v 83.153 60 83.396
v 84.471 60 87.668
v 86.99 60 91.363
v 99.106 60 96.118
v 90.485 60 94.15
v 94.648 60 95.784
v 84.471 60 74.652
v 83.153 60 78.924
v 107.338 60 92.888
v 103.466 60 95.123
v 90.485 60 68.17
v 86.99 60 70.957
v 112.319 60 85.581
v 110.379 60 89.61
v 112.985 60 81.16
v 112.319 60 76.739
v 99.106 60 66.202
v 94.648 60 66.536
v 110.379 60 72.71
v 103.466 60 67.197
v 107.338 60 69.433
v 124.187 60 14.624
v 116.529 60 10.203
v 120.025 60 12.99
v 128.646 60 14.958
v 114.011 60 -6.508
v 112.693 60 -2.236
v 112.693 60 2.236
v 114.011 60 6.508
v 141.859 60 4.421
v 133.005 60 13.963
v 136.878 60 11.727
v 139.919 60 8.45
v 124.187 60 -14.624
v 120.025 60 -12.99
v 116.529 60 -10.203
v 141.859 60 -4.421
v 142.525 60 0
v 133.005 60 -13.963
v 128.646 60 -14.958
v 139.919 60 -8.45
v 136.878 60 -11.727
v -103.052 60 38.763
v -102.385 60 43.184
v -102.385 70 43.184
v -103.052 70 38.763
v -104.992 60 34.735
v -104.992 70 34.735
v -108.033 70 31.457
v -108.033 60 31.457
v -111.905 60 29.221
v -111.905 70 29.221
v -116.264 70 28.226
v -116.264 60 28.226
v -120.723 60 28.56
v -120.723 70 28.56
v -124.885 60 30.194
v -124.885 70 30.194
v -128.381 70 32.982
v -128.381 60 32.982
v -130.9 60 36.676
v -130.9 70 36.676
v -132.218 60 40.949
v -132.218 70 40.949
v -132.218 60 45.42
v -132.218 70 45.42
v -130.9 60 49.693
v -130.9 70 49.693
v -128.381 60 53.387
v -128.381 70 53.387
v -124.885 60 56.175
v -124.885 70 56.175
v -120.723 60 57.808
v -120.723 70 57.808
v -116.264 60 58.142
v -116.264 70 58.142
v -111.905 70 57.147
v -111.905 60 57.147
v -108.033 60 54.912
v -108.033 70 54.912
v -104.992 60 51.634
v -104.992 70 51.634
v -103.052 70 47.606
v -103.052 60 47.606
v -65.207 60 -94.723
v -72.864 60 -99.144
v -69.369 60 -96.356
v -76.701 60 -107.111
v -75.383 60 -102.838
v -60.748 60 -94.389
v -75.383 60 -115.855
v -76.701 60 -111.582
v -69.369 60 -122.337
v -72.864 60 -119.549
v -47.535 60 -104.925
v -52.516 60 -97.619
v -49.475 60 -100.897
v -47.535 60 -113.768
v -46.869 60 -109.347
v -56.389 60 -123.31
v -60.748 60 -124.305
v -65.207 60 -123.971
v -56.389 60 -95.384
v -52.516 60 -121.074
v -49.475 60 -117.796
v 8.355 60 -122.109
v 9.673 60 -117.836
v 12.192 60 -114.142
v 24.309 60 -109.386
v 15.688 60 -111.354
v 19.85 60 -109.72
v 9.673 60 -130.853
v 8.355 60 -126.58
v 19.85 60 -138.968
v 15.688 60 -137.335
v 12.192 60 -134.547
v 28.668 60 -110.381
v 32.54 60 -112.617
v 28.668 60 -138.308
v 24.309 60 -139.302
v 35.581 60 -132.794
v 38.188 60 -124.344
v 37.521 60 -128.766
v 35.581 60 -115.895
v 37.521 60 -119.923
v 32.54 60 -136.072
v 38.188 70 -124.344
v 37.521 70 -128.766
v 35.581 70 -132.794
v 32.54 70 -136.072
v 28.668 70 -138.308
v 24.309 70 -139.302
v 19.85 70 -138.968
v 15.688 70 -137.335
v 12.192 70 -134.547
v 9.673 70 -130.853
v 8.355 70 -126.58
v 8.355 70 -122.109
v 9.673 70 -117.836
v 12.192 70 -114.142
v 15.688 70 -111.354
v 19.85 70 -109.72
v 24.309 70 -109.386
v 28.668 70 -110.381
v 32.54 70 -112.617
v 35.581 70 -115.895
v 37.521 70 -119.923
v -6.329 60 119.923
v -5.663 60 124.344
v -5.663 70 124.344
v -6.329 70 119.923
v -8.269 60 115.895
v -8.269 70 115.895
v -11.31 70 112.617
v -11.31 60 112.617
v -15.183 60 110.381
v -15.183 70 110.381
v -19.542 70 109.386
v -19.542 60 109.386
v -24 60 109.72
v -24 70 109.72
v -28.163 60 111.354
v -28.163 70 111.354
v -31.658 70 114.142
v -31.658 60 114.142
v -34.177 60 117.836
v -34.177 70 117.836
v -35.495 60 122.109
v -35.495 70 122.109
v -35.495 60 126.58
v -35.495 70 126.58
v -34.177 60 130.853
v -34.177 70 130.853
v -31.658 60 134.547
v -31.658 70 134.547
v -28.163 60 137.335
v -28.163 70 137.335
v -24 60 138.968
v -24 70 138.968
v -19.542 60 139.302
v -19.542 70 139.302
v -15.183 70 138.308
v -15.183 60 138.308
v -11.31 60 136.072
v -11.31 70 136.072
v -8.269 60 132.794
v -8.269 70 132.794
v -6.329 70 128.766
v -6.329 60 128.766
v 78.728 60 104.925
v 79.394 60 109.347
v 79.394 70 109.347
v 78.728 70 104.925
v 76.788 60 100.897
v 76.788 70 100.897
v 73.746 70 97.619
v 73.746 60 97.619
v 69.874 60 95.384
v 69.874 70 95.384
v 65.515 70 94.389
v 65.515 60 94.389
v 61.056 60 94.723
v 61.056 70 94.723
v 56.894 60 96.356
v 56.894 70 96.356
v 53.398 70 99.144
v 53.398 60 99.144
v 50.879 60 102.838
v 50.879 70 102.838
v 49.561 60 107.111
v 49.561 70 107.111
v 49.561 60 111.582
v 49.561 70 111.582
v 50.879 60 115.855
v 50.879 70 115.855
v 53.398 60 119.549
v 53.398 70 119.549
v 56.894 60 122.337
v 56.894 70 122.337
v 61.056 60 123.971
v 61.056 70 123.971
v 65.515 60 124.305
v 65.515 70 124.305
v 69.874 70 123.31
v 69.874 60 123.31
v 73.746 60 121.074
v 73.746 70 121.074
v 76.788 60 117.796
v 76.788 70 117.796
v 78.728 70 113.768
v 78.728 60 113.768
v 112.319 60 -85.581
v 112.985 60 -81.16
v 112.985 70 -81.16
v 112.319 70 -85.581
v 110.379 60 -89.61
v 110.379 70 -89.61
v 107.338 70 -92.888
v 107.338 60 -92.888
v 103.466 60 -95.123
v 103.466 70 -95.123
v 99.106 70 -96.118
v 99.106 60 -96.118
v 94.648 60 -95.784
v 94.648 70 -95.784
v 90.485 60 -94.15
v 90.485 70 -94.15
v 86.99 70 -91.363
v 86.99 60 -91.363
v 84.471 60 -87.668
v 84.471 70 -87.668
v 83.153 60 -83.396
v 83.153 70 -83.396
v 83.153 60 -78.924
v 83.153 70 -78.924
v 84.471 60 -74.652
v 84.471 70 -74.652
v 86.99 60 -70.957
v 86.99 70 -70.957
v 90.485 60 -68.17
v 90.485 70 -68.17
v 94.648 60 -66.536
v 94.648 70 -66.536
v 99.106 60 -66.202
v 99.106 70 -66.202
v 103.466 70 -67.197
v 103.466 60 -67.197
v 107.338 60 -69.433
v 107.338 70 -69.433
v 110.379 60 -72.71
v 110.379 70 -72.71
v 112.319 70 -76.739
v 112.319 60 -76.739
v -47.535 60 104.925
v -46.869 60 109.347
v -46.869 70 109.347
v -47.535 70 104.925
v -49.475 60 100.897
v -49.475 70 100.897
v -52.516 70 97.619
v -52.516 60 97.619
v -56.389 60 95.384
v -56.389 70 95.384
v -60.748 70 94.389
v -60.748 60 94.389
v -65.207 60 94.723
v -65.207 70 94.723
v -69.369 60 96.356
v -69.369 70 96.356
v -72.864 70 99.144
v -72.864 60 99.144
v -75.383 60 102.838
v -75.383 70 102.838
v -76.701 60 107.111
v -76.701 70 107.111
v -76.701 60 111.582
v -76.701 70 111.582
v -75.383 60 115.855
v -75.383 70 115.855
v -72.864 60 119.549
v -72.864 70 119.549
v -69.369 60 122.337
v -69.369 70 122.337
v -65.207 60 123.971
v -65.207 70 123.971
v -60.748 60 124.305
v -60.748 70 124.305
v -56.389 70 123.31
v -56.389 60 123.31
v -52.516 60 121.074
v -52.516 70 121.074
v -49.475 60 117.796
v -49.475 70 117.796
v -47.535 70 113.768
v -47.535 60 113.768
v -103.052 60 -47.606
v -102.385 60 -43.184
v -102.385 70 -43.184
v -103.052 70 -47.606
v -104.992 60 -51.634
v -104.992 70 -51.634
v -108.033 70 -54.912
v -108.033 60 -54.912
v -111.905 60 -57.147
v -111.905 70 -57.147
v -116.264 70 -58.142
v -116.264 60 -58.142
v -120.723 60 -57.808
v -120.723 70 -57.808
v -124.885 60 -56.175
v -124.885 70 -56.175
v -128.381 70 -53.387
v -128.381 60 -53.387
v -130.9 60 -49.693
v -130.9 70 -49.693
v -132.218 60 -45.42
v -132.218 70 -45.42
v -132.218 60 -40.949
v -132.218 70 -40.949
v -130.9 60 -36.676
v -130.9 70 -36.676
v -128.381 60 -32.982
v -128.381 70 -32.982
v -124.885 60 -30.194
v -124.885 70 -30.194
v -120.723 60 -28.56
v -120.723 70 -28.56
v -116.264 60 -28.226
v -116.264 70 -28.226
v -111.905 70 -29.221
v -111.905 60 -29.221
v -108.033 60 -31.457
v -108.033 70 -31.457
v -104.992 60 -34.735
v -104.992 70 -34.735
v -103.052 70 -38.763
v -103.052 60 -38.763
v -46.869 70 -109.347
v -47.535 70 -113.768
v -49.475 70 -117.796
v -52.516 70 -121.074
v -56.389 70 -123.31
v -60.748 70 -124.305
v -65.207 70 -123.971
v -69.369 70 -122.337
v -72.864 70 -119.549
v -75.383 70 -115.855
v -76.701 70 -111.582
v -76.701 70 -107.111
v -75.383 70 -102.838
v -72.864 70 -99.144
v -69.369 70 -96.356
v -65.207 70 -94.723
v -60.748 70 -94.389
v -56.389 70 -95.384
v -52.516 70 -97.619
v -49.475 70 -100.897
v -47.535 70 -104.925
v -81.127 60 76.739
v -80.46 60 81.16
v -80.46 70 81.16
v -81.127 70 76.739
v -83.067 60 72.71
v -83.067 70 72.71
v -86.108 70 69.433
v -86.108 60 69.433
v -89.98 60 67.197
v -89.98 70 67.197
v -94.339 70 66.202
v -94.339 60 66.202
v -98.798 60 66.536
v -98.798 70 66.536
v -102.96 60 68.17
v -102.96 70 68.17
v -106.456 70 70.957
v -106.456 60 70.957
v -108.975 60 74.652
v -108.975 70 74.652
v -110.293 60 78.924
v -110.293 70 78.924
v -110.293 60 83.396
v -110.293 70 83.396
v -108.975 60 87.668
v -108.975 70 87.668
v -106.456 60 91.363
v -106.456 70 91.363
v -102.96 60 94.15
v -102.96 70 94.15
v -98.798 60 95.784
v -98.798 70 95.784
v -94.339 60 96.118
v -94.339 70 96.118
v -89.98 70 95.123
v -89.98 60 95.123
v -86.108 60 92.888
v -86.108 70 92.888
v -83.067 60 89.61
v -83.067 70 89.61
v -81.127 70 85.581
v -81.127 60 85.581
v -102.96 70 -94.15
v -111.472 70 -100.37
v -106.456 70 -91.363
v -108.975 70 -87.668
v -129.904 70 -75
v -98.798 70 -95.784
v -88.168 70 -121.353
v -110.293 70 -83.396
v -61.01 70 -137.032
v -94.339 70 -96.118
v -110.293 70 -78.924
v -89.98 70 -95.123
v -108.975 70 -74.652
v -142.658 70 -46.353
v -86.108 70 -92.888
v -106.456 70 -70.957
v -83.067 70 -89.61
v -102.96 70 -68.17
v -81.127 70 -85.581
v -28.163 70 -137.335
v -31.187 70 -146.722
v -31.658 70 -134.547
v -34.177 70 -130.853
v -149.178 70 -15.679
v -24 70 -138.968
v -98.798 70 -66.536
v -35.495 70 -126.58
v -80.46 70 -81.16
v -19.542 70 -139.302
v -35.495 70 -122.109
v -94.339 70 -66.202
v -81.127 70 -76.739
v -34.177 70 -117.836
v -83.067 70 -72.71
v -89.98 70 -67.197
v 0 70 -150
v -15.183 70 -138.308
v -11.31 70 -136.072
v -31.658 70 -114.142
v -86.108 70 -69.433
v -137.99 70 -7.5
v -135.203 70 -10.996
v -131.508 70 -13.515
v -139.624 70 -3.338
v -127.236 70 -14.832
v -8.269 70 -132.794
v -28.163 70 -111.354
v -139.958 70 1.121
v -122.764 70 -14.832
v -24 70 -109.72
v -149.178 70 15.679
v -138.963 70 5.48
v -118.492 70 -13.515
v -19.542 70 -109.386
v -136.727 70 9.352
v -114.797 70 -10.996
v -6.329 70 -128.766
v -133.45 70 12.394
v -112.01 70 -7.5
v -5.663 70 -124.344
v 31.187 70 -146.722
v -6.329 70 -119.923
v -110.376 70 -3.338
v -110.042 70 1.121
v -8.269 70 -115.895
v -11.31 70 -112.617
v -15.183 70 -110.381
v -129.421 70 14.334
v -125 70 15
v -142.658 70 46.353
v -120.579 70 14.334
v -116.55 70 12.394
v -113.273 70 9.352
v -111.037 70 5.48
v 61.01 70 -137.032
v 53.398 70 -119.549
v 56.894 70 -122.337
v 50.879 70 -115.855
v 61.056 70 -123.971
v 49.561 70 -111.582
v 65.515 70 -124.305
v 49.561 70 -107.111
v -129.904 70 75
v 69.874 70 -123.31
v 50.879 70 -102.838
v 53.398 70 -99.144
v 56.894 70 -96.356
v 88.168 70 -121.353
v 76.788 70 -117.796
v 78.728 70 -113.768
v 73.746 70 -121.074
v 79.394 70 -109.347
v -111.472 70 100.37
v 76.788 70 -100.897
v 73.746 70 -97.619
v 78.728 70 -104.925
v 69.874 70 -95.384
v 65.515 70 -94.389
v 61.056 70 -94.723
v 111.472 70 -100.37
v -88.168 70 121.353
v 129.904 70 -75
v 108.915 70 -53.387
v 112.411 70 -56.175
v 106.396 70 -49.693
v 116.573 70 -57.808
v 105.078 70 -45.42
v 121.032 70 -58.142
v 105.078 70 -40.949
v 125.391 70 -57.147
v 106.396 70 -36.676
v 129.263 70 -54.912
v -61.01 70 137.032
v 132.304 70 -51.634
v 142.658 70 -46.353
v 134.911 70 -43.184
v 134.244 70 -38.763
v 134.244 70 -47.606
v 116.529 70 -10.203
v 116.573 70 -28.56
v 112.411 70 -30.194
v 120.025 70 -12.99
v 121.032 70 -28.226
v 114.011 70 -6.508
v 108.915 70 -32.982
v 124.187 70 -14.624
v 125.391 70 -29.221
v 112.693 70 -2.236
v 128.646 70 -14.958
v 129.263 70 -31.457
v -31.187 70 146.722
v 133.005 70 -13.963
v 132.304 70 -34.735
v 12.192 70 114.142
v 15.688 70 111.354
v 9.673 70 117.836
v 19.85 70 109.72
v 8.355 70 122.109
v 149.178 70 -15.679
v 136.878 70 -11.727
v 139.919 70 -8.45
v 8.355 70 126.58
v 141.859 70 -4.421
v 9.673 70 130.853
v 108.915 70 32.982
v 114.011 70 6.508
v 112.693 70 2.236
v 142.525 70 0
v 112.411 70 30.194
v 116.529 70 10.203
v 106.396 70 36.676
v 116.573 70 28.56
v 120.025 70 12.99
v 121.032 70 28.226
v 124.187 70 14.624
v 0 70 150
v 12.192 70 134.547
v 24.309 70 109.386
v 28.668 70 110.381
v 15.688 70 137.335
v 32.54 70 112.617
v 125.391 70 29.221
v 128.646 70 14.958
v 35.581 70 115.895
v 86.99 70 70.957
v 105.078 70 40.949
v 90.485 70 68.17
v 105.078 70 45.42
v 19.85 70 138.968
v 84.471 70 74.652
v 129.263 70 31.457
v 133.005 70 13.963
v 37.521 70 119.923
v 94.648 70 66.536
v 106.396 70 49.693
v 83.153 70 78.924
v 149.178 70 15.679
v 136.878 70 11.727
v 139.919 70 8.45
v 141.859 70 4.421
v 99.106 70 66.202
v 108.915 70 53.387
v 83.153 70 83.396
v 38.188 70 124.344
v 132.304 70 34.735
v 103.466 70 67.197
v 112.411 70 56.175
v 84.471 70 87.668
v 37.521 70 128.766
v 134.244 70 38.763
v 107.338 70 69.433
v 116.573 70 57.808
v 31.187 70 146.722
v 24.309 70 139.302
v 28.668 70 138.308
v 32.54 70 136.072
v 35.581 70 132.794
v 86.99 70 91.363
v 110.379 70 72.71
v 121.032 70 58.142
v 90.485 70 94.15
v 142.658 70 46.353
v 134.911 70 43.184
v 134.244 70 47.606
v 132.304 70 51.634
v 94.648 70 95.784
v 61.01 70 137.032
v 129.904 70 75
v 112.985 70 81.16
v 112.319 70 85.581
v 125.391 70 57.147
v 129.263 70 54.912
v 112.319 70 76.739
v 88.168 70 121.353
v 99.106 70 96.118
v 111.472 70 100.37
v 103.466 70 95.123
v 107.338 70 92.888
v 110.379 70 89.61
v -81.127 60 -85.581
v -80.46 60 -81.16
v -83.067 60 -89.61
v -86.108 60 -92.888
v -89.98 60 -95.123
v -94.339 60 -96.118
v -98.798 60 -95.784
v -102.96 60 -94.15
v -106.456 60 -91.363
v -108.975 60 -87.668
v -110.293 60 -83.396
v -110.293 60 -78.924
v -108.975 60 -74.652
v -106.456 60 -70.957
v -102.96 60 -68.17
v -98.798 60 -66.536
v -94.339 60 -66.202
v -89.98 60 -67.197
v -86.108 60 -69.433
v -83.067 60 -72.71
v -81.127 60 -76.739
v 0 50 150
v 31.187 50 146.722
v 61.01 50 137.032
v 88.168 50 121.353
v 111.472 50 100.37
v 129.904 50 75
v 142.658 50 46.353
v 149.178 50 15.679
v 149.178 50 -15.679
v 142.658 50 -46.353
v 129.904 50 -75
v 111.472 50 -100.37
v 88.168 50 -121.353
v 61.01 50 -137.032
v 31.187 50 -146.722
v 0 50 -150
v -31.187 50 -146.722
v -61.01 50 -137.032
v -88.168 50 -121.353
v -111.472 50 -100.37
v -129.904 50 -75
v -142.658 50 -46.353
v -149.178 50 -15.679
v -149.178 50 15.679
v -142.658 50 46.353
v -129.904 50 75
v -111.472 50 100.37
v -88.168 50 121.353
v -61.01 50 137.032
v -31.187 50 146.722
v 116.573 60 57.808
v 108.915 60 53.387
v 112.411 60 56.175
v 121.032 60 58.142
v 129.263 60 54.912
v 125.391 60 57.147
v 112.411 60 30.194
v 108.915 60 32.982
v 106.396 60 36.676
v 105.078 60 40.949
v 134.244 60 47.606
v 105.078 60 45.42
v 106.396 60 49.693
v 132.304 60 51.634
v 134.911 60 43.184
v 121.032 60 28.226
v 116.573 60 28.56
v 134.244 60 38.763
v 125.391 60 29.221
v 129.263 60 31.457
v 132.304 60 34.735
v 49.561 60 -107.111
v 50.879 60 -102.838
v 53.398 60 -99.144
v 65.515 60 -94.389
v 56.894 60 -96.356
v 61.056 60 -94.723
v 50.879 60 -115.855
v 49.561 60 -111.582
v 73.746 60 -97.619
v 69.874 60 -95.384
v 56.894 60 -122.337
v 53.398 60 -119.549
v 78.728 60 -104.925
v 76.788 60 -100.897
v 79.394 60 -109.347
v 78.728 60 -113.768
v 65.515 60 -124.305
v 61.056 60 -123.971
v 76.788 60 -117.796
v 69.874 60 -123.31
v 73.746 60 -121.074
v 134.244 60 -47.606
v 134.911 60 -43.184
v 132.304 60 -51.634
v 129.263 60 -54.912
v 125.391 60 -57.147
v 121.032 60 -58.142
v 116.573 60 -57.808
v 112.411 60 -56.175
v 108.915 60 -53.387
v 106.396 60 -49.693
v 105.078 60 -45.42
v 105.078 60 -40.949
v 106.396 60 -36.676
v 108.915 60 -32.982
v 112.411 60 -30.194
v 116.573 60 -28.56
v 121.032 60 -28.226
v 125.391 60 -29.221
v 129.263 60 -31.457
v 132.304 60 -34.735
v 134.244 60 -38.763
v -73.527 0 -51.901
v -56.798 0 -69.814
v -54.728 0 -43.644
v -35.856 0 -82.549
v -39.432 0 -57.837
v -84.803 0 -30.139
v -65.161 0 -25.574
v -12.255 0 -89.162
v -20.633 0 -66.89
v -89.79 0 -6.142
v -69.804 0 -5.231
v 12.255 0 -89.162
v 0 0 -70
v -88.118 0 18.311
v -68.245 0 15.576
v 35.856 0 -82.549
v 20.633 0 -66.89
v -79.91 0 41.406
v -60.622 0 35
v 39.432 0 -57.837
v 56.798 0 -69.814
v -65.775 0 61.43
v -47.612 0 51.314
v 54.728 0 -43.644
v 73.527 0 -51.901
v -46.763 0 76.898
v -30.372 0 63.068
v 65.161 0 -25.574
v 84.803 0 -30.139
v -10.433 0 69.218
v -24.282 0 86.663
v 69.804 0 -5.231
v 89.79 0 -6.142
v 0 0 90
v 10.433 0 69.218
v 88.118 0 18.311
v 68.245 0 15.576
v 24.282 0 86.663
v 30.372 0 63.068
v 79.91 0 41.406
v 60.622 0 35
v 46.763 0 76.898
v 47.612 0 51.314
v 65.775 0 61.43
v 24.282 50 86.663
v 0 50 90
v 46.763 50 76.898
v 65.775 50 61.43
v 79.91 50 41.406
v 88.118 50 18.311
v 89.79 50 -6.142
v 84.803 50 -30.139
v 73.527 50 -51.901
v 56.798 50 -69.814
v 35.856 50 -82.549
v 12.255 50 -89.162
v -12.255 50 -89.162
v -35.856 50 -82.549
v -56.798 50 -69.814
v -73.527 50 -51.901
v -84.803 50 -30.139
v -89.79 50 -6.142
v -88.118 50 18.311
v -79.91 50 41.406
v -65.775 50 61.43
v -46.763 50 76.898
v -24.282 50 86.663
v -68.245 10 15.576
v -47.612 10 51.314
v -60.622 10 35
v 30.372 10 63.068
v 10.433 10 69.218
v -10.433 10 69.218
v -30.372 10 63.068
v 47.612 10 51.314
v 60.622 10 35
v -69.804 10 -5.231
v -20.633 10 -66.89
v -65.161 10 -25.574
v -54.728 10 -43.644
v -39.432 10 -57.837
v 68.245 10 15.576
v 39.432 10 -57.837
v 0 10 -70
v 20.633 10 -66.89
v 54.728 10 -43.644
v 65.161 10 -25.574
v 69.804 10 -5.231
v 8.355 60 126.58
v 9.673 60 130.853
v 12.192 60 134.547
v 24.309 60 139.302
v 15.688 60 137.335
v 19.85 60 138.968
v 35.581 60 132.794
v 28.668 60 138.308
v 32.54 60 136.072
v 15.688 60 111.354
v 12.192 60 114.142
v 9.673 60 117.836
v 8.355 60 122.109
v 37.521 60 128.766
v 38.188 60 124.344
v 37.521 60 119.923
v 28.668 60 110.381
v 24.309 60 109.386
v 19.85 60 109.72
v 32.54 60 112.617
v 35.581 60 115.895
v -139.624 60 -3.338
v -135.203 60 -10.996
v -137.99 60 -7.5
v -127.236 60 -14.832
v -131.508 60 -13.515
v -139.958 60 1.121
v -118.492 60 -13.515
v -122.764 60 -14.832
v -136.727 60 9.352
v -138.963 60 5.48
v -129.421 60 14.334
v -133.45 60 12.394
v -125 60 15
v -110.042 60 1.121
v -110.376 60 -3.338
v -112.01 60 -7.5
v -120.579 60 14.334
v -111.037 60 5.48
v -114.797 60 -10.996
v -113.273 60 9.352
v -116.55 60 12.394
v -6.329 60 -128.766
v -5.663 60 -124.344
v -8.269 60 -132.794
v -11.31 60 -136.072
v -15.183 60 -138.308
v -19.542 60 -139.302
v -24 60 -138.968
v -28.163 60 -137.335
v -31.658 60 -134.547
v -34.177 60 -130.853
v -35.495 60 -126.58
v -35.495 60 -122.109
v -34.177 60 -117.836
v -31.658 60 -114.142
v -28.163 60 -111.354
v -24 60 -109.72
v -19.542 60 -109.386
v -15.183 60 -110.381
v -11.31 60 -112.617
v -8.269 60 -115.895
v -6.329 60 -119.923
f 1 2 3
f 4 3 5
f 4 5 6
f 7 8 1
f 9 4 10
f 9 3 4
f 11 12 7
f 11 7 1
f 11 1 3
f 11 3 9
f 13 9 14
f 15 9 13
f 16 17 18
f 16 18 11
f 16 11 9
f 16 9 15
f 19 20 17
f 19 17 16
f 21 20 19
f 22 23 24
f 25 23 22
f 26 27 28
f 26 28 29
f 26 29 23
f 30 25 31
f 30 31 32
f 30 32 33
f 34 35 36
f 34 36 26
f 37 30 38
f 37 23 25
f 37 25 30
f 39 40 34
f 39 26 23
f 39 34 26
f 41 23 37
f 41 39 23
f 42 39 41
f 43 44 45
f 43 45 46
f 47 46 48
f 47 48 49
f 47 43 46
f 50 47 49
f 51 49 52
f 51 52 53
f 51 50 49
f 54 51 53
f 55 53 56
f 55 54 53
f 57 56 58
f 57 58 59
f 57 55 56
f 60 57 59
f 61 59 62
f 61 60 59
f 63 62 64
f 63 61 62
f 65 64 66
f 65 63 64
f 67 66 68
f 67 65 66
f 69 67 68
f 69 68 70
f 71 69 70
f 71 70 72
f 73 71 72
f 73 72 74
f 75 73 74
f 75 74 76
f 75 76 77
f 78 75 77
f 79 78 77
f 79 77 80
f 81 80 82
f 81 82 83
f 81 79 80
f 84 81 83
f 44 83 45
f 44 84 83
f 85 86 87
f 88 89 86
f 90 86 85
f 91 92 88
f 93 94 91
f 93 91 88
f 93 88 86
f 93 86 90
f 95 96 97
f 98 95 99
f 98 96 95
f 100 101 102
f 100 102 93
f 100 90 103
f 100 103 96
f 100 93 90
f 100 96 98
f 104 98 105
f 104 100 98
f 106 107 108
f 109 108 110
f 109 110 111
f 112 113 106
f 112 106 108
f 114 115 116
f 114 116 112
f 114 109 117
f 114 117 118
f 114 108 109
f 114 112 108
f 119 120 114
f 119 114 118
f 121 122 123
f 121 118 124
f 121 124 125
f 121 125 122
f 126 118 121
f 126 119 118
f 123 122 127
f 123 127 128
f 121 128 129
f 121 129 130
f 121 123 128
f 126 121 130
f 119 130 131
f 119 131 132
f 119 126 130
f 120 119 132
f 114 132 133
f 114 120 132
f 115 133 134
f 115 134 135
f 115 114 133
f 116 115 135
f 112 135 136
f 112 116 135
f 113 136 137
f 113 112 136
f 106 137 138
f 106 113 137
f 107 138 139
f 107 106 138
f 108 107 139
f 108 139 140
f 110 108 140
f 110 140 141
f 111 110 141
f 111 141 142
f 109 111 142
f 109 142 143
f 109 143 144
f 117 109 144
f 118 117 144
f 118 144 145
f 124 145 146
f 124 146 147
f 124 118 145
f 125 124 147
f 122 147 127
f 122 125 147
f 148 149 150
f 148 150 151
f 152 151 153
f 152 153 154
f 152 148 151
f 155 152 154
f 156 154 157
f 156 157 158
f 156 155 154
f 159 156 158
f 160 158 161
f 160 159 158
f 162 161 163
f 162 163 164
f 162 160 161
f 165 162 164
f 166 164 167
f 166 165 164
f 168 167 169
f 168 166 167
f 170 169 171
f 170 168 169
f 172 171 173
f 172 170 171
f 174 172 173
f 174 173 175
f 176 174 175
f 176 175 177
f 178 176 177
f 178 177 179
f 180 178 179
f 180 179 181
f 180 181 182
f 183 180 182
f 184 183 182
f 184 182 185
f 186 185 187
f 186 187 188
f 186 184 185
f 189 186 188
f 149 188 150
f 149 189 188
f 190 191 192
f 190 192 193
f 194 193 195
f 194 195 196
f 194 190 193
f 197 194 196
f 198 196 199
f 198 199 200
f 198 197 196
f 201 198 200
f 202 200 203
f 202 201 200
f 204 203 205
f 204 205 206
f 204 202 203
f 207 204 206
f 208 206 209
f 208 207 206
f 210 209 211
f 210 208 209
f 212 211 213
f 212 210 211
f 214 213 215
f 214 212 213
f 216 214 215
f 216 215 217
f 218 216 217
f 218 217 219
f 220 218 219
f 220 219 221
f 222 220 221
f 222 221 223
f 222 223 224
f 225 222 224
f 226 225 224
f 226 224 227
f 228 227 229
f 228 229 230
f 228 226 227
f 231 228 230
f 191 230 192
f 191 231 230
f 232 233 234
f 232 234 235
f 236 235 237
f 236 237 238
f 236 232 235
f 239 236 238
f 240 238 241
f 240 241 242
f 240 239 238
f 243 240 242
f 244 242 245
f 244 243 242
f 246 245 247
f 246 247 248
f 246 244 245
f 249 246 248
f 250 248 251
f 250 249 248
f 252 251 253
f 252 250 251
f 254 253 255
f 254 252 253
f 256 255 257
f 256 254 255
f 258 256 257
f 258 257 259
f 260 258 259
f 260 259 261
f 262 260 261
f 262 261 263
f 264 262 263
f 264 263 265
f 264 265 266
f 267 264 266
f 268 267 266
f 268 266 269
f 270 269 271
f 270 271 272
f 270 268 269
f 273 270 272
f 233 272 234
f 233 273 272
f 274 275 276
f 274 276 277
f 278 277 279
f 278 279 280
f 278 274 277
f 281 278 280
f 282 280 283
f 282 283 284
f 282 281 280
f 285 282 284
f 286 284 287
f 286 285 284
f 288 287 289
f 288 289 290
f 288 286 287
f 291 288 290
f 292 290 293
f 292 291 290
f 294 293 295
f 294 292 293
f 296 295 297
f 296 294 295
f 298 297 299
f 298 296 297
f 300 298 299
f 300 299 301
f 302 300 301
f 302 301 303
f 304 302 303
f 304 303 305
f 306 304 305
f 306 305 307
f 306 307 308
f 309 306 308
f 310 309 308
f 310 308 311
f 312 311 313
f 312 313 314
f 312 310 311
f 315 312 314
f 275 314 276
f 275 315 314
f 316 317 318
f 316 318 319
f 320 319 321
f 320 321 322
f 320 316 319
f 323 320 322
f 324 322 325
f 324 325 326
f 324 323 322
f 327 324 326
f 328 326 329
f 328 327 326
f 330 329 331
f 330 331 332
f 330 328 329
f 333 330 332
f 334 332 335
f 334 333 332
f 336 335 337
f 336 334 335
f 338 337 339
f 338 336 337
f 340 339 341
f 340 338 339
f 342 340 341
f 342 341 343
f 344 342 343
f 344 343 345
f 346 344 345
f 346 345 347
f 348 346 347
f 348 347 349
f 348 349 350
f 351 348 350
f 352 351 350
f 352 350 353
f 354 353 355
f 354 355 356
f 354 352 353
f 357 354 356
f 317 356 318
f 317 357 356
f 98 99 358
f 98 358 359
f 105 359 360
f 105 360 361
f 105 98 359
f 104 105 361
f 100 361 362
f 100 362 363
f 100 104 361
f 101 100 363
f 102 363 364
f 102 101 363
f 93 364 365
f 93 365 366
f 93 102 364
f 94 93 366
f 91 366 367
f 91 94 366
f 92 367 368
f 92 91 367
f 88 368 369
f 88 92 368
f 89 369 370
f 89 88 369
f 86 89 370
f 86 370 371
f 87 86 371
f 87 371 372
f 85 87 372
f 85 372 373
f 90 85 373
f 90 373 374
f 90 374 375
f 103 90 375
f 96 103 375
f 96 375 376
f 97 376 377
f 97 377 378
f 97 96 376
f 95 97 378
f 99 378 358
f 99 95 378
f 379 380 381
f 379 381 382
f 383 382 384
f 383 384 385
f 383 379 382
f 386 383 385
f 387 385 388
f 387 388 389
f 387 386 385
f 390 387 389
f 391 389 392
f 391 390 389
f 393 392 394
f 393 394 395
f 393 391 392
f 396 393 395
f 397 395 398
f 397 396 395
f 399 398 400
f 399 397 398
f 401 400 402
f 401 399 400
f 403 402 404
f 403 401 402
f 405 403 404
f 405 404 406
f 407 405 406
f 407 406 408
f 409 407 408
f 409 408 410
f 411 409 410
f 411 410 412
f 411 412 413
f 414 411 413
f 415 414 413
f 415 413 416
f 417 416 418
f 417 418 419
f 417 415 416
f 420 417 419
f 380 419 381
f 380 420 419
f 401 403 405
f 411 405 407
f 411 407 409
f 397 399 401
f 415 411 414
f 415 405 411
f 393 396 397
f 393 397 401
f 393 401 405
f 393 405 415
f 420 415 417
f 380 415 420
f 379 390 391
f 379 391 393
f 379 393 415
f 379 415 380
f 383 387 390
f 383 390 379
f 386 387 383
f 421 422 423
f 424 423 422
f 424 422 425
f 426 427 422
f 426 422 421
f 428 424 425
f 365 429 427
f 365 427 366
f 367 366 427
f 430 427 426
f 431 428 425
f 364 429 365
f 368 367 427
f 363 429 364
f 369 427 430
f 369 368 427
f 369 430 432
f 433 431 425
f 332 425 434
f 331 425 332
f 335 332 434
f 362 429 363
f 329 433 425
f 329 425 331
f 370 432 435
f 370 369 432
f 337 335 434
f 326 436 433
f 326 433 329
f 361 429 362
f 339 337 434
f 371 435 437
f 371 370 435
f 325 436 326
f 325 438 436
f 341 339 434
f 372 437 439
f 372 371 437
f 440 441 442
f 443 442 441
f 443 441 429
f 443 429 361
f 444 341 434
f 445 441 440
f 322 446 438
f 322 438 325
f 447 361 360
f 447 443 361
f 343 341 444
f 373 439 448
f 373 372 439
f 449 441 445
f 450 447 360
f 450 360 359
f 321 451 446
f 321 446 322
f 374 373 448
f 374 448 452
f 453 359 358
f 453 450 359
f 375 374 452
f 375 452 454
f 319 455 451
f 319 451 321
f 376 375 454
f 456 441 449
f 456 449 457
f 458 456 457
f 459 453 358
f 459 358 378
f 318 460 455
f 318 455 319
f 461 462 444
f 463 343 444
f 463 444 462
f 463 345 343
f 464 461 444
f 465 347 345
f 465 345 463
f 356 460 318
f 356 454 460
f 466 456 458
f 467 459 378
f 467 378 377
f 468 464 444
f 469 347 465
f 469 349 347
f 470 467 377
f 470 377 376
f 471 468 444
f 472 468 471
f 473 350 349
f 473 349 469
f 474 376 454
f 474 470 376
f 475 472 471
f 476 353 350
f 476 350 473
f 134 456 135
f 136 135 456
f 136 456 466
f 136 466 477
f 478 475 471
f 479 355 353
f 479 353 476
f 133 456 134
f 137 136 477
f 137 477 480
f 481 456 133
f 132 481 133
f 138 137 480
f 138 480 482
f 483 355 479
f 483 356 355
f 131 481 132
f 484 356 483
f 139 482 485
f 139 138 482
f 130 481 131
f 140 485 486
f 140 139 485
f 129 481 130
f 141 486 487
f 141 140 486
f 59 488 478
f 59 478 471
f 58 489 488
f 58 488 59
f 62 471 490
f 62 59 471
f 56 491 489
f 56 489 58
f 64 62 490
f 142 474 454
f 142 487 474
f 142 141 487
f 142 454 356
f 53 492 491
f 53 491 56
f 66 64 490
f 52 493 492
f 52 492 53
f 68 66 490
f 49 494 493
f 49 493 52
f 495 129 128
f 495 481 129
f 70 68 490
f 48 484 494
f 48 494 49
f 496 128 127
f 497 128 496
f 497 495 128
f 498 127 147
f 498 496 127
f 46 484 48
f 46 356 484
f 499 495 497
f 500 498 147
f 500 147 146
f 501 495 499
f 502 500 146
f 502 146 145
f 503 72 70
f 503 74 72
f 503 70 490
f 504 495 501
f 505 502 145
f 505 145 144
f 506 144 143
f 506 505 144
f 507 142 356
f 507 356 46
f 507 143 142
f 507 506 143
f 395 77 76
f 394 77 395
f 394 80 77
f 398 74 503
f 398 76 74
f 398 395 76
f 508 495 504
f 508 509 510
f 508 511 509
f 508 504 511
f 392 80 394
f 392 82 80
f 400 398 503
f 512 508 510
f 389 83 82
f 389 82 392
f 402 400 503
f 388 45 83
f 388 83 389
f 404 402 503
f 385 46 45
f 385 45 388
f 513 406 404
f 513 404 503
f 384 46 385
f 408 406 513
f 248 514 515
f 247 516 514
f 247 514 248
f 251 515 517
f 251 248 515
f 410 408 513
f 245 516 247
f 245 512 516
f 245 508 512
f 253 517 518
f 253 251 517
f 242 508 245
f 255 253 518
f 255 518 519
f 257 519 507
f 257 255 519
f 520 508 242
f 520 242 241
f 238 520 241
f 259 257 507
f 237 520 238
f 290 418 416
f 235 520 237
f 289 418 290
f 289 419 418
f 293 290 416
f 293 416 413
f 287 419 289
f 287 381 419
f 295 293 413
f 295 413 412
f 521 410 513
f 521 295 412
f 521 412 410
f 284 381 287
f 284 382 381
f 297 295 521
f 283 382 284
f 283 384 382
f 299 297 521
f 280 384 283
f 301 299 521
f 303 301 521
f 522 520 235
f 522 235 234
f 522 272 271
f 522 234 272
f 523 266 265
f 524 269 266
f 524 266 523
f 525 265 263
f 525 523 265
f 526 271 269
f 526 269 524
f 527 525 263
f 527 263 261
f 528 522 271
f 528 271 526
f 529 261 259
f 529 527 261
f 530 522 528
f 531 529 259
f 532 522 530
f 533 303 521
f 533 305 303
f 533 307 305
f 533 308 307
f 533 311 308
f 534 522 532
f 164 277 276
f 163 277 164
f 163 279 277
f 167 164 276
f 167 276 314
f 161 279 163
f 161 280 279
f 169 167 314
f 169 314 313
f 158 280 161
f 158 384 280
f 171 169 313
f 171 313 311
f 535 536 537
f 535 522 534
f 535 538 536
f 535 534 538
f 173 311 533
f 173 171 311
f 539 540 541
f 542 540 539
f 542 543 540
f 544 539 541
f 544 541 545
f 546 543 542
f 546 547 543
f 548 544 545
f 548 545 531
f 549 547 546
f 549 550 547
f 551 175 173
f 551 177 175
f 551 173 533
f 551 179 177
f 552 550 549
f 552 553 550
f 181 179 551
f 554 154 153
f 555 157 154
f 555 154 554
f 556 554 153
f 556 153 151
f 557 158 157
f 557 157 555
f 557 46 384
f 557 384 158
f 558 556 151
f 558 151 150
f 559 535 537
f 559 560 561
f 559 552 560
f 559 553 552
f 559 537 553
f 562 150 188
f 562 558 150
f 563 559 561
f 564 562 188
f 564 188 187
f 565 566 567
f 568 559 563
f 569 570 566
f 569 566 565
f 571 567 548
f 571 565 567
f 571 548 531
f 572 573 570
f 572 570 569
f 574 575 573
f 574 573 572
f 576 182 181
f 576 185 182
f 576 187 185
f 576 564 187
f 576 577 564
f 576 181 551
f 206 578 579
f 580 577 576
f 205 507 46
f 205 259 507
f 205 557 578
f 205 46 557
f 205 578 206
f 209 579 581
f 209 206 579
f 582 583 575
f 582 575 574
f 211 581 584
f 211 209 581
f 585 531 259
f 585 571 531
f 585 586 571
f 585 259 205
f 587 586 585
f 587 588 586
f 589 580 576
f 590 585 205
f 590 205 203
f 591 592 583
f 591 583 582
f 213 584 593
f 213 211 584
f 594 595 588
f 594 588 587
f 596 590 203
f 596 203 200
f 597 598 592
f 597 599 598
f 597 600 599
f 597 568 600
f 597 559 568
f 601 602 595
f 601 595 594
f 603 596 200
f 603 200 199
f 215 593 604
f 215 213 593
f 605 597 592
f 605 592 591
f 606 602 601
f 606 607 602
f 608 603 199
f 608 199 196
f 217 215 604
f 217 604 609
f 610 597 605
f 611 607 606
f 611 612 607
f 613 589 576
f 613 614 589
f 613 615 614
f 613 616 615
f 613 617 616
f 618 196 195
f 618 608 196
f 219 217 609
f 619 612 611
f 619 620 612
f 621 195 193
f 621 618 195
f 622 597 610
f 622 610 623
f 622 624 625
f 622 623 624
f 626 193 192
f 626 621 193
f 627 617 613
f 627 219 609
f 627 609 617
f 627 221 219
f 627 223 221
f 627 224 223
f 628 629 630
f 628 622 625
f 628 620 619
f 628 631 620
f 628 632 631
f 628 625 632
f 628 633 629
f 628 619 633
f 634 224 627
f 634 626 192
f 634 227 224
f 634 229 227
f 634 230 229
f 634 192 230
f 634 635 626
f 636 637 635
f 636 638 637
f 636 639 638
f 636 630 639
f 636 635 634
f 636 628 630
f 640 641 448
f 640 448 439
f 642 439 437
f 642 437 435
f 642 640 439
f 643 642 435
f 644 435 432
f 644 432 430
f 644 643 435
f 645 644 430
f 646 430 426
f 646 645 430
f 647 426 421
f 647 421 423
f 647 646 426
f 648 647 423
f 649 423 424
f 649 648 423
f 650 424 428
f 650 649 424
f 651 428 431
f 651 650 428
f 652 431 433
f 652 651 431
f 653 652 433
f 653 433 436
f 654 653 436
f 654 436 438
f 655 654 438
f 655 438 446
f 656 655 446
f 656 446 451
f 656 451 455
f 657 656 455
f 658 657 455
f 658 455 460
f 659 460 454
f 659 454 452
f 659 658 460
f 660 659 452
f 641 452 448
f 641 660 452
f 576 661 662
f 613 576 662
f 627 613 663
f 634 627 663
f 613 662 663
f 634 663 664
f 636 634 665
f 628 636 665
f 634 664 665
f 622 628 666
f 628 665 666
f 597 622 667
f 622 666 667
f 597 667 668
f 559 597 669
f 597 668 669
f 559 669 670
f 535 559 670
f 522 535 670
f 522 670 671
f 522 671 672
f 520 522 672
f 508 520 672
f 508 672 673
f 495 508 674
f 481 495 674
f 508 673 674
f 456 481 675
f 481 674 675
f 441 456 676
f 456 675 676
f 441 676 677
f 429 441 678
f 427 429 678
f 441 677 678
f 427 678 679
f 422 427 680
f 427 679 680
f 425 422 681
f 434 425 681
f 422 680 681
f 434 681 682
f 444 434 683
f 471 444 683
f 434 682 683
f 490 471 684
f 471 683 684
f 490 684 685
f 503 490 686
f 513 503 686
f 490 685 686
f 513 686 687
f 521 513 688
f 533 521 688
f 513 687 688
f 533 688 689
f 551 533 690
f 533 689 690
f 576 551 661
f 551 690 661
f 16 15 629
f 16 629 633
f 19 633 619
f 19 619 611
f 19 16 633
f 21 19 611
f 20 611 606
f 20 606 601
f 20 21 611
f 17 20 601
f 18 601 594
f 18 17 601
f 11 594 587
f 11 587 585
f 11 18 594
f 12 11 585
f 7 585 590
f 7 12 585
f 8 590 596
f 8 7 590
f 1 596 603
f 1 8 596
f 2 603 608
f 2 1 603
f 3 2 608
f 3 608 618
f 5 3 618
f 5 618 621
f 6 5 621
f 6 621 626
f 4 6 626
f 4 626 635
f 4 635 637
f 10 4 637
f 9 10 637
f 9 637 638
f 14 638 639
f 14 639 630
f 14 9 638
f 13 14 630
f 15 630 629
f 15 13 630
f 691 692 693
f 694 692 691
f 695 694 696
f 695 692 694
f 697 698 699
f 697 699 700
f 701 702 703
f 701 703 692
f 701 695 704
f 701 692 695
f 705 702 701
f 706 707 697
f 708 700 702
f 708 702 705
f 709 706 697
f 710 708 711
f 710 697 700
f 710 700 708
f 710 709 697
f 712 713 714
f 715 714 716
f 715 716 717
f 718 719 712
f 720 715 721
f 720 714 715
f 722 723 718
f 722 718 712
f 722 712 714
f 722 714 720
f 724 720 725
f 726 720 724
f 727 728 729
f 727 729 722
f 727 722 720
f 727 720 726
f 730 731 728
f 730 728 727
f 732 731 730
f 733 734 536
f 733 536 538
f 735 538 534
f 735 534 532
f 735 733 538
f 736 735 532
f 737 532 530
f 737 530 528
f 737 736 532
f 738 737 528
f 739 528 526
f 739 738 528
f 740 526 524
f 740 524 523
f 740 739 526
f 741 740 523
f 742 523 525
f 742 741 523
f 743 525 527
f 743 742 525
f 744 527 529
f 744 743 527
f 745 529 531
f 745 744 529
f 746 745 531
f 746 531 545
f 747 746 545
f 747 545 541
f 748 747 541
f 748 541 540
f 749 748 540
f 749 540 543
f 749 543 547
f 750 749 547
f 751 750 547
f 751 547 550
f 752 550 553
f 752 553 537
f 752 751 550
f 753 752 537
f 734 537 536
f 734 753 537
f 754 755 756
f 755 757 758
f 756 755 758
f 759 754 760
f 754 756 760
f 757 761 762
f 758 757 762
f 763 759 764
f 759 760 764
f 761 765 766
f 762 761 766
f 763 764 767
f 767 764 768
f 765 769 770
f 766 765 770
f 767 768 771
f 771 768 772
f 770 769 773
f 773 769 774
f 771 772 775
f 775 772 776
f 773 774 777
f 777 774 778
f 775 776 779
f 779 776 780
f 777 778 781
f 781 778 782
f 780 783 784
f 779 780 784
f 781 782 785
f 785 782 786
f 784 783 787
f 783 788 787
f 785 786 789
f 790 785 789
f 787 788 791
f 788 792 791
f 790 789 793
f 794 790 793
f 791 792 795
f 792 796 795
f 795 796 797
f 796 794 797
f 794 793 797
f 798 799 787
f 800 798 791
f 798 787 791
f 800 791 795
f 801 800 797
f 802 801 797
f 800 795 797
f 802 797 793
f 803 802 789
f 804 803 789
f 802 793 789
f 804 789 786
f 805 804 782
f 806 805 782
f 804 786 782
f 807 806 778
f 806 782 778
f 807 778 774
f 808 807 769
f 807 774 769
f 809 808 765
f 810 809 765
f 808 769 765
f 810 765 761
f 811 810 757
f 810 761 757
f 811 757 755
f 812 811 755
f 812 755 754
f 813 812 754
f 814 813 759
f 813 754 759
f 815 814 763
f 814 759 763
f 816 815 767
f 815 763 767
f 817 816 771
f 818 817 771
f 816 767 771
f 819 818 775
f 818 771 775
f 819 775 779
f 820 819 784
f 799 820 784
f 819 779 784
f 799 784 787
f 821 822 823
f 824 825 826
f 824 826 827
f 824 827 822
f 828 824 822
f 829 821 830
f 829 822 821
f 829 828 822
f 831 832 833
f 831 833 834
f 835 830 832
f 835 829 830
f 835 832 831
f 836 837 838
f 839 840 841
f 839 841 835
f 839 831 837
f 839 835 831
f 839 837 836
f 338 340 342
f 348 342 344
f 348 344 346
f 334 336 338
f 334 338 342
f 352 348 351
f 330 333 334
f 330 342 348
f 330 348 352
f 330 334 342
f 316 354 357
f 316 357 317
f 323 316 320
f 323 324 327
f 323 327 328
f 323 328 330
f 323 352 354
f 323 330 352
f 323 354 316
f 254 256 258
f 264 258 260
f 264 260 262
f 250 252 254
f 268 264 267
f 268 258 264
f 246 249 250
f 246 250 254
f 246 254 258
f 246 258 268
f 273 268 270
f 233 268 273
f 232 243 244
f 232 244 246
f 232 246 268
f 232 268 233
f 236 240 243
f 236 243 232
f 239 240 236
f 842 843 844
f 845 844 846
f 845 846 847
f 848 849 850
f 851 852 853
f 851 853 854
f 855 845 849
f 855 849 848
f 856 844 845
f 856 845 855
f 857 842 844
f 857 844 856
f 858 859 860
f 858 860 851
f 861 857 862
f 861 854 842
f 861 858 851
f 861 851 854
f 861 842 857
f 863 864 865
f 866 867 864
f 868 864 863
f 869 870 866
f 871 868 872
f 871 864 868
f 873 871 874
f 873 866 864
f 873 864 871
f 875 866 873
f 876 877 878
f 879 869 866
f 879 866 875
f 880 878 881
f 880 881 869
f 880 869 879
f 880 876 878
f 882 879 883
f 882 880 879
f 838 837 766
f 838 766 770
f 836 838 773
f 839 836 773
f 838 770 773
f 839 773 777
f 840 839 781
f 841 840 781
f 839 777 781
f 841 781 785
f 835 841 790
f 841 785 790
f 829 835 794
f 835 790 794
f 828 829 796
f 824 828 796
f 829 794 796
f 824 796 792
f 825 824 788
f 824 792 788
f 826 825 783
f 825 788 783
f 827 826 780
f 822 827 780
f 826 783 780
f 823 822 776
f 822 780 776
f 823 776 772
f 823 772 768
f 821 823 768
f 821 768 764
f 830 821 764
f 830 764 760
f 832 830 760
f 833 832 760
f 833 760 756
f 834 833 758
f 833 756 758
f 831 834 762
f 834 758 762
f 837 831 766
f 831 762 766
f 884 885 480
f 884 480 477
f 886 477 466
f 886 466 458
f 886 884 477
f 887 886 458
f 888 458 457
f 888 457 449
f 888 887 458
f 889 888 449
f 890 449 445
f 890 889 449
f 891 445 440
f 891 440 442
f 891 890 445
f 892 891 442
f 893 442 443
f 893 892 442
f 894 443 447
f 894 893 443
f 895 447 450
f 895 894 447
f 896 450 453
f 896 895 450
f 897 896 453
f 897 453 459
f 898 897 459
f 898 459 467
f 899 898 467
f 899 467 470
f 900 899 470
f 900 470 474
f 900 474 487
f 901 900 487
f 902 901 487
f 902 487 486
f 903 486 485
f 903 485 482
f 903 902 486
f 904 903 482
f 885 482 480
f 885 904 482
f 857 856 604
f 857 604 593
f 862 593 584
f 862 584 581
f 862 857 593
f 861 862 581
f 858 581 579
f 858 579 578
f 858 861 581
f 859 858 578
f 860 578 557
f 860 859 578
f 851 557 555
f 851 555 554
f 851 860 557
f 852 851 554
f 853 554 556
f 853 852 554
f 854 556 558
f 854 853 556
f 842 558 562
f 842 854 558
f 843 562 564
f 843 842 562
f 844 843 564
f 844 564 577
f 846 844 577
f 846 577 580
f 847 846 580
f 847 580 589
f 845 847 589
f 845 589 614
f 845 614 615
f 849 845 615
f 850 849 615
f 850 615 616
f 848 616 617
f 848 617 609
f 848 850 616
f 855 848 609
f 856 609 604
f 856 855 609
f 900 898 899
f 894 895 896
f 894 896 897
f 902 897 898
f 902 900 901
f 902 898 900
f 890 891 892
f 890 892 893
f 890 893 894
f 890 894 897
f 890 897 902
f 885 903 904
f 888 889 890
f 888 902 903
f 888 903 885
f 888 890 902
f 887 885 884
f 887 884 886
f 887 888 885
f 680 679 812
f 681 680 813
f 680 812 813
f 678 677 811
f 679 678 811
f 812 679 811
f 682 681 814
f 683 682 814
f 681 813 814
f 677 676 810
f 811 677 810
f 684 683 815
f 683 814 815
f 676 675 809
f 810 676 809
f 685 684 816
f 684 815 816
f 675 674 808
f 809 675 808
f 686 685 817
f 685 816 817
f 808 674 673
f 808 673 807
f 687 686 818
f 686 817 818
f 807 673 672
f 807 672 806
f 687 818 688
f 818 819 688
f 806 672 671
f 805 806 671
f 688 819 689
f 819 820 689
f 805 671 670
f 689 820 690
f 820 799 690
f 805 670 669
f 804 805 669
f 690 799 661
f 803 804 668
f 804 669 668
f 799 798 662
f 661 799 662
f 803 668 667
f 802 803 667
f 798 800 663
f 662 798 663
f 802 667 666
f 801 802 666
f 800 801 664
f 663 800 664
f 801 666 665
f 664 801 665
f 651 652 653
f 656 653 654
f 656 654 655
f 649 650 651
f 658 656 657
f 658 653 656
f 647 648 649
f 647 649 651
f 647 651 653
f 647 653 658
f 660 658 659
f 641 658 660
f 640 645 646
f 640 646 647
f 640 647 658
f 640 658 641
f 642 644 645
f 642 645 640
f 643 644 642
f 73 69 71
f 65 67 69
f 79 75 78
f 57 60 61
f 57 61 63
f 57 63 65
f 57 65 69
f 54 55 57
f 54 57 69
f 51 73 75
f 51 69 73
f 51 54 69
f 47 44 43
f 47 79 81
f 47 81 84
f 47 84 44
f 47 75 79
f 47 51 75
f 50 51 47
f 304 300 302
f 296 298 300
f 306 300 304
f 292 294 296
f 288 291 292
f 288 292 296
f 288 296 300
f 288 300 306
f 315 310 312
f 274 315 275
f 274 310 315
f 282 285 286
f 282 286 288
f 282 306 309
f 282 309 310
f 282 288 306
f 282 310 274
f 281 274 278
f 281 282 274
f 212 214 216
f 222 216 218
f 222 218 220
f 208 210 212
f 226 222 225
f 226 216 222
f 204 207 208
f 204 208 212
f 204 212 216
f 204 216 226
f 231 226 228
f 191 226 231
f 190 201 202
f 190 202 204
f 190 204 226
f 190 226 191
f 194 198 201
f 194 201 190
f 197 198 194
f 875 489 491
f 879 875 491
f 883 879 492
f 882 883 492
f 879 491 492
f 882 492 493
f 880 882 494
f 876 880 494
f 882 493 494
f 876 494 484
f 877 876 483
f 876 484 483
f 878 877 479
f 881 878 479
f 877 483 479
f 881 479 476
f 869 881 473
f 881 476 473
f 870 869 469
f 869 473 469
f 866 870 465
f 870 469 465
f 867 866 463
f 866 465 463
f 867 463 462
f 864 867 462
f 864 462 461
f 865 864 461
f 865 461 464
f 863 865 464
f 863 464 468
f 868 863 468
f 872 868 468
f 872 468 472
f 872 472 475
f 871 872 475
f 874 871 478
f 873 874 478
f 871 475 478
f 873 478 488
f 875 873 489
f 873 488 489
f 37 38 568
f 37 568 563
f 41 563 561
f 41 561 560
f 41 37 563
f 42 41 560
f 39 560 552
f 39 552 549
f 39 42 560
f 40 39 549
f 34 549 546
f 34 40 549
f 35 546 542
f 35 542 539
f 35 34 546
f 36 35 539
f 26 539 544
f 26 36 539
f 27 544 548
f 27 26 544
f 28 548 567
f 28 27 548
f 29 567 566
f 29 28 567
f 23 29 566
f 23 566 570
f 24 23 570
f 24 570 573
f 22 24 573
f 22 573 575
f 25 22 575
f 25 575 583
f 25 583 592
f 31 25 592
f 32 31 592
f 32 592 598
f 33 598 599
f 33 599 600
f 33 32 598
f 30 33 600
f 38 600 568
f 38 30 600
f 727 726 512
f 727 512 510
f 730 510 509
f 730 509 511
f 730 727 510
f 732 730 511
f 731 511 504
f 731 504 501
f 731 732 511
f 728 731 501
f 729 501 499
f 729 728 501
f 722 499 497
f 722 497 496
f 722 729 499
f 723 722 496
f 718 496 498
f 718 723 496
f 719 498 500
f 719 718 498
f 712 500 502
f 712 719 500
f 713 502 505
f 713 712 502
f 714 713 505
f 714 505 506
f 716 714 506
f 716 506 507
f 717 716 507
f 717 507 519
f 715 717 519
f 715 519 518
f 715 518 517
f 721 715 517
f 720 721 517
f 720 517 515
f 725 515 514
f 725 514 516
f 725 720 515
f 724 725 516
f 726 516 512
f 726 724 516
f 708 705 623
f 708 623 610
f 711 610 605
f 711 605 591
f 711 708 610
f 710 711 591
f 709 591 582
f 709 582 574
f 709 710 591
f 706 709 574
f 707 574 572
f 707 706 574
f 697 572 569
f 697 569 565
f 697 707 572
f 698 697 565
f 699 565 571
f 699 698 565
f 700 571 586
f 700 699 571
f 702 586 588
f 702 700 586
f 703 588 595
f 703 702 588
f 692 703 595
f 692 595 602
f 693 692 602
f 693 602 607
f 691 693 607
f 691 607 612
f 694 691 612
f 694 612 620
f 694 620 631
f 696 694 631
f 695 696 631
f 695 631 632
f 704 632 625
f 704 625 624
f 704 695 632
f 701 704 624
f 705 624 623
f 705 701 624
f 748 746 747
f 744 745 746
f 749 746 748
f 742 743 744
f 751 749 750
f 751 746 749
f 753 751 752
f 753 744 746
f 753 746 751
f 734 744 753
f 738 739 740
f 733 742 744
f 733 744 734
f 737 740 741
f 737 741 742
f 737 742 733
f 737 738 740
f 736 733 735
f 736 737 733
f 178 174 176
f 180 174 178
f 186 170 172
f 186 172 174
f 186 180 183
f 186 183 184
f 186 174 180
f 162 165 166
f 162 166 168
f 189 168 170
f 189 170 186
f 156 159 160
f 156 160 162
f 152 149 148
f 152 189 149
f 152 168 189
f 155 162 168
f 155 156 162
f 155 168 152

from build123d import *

# Parameters (mm, degrees)
ESQUISSE1_R                      = 90
BOSS_EXTRU_1_DEPTH               = 50
ESQUISSE2_R                      = 70
ENL_V_MAT_EXTRU_1_DEPTH          = 10
ESQUISSE3_R                      = 150
BOSS_EXTRU_2_DEPTH               = 20
ESQUISSE4_R                      = 15
ENL_V_MAT_EXTRU_2_DEPTH          = 10
R_P_TITION_START                 = 60
R_P_TITION_CIRCULAIRE1_OUTLINE_R = 15
R_P_TITION_CIRCULAIRE1_DEPTH     = 10


# Read off the part's stored shape, not the designer's step: Répétition circulaire1
with BuildPart() as part:
    # Esquisse1 → Boss.-Extru.1 (new body)
    with BuildSketch(Plane(origin=(0, 0, 0), x_dir=(1, 0, 0), z_dir=(0, 1, 0))):
        with Locations(Location((0, 0, 0), (0, 0, 270))):
            Circle(ESQUISSE1_R)
    extrude(amount=BOSS_EXTRU_1_DEPTH)

    # Esquisse2 → Enlèv. mat.-Extru.1 (cut)
    with BuildSketch(Plane(origin=(0, 0, 0), x_dir=(-1, 0, 0), z_dir=(0, -1, 0))):
        with Locations(Location((0, 0, 0), (0, 0, 90))):
            Circle(ESQUISSE2_R)
    extrude(amount=-ENL_V_MAT_EXTRU_1_DEPTH, mode=Mode.SUBTRACT)

    # Esquisse3 → Boss.-Extru.2 (add)
    with BuildSketch(Plane(origin=(0, 50, 0), x_dir=(1, 0, 0), z_dir=(0, 1, 0))):
        with Locations(Location((0, 0, 0), (0, 0, 270))):
            Circle(ESQUISSE3_R)
    extrude(amount=BOSS_EXTRU_2_DEPTH)

    # Esquisse4 → Enlèv. mat.-Extru.2 (cut)
    with BuildSketch(Plane(origin=(0, 70, 0), x_dir=(1, 0, 0), z_dir=(0, 1, 0))):
        with Locations(Location((-125, 0, 0), (0, 0, 270))):
            Circle(ESQUISSE4_R)
    extrude(amount=-ENL_V_MAT_EXTRU_2_DEPTH, mode=Mode.SUBTRACT)

    # Répétition circulaire1 outline → Répétition circulaire1 (cut)
    with BuildSketch(Plane(origin=(0, 0, 0), x_dir=(1, 0, 0), z_dir=(0, 1, 0)).offset(R_P_TITION_START)):
        with Locations((-117.385431917, -43.184361531)):
            Circle(R_P_TITION_CIRCULAIRE1_OUTLINE_R)
        with Locations((-117.385431917, 43.184361531)):
            Circle(R_P_TITION_CIRCULAIRE1_OUTLINE_R)
        with Locations((-95.460156959, 81.160051728)):
            Circle(R_P_TITION_CIRCULAIRE1_OUTLINE_R)
        with Locations((-61.868686869, 109.346641892)):
            Circle(R_P_TITION_CIRCULAIRE1_OUTLINE_R)
        with Locations((-20.662648695, 124.344413259)):
            Circle(R_P_TITION_CIRCULAIRE1_OUTLINE_R)
        with Locations((23.187901221, 124.344413259)):
            Circle(R_P_TITION_CIRCULAIRE1_OUTLINE_R)
        with Locations((64.393939394, 109.346641892)):
            Circle(R_P_TITION_CIRCULAIRE1_OUTLINE_R)
        with Locations((97.985409485, 81.160051728)):
            Circle(R_P_TITION_CIRCULAIRE1_OUTLINE_R)
        with Locations((119.910684443, 43.184361531)):
            Circle(R_P_TITION_CIRCULAIRE1_OUTLINE_R)
        with Locations((127.525252525, 0)):
            Circle(R_P_TITION_CIRCULAIRE1_OUTLINE_R)
        with Locations((119.910684443, -43.184361531)):
            Circle(R_P_TITION_CIRCULAIRE1_OUTLINE_R)
        with Locations((97.985409485, -81.160051728)):
            Circle(R_P_TITION_CIRCULAIRE1_OUTLINE_R)
        with Locations((64.393939394, -109.346641892)):
            Circle(R_P_TITION_CIRCULAIRE1_OUTLINE_R)
        with Locations((23.187901221, -124.344413259)):
            Circle(R_P_TITION_CIRCULAIRE1_OUTLINE_R)
        with Locations((-20.662648695, -124.344413259)):
            Circle(R_P_TITION_CIRCULAIRE1_OUTLINE_R)
        with Locations((-61.868686869, -109.346641892)):
            Circle(R_P_TITION_CIRCULAIRE1_OUTLINE_R)
        with Locations((-95.460156959, -81.160051728)):
            Circle(R_P_TITION_CIRCULAIRE1_OUTLINE_R)
    extrude(amount=R_P_TITION_CIRCULAIRE1_DEPTH, mode=Mode.SUBTRACT)


solid = part.part
